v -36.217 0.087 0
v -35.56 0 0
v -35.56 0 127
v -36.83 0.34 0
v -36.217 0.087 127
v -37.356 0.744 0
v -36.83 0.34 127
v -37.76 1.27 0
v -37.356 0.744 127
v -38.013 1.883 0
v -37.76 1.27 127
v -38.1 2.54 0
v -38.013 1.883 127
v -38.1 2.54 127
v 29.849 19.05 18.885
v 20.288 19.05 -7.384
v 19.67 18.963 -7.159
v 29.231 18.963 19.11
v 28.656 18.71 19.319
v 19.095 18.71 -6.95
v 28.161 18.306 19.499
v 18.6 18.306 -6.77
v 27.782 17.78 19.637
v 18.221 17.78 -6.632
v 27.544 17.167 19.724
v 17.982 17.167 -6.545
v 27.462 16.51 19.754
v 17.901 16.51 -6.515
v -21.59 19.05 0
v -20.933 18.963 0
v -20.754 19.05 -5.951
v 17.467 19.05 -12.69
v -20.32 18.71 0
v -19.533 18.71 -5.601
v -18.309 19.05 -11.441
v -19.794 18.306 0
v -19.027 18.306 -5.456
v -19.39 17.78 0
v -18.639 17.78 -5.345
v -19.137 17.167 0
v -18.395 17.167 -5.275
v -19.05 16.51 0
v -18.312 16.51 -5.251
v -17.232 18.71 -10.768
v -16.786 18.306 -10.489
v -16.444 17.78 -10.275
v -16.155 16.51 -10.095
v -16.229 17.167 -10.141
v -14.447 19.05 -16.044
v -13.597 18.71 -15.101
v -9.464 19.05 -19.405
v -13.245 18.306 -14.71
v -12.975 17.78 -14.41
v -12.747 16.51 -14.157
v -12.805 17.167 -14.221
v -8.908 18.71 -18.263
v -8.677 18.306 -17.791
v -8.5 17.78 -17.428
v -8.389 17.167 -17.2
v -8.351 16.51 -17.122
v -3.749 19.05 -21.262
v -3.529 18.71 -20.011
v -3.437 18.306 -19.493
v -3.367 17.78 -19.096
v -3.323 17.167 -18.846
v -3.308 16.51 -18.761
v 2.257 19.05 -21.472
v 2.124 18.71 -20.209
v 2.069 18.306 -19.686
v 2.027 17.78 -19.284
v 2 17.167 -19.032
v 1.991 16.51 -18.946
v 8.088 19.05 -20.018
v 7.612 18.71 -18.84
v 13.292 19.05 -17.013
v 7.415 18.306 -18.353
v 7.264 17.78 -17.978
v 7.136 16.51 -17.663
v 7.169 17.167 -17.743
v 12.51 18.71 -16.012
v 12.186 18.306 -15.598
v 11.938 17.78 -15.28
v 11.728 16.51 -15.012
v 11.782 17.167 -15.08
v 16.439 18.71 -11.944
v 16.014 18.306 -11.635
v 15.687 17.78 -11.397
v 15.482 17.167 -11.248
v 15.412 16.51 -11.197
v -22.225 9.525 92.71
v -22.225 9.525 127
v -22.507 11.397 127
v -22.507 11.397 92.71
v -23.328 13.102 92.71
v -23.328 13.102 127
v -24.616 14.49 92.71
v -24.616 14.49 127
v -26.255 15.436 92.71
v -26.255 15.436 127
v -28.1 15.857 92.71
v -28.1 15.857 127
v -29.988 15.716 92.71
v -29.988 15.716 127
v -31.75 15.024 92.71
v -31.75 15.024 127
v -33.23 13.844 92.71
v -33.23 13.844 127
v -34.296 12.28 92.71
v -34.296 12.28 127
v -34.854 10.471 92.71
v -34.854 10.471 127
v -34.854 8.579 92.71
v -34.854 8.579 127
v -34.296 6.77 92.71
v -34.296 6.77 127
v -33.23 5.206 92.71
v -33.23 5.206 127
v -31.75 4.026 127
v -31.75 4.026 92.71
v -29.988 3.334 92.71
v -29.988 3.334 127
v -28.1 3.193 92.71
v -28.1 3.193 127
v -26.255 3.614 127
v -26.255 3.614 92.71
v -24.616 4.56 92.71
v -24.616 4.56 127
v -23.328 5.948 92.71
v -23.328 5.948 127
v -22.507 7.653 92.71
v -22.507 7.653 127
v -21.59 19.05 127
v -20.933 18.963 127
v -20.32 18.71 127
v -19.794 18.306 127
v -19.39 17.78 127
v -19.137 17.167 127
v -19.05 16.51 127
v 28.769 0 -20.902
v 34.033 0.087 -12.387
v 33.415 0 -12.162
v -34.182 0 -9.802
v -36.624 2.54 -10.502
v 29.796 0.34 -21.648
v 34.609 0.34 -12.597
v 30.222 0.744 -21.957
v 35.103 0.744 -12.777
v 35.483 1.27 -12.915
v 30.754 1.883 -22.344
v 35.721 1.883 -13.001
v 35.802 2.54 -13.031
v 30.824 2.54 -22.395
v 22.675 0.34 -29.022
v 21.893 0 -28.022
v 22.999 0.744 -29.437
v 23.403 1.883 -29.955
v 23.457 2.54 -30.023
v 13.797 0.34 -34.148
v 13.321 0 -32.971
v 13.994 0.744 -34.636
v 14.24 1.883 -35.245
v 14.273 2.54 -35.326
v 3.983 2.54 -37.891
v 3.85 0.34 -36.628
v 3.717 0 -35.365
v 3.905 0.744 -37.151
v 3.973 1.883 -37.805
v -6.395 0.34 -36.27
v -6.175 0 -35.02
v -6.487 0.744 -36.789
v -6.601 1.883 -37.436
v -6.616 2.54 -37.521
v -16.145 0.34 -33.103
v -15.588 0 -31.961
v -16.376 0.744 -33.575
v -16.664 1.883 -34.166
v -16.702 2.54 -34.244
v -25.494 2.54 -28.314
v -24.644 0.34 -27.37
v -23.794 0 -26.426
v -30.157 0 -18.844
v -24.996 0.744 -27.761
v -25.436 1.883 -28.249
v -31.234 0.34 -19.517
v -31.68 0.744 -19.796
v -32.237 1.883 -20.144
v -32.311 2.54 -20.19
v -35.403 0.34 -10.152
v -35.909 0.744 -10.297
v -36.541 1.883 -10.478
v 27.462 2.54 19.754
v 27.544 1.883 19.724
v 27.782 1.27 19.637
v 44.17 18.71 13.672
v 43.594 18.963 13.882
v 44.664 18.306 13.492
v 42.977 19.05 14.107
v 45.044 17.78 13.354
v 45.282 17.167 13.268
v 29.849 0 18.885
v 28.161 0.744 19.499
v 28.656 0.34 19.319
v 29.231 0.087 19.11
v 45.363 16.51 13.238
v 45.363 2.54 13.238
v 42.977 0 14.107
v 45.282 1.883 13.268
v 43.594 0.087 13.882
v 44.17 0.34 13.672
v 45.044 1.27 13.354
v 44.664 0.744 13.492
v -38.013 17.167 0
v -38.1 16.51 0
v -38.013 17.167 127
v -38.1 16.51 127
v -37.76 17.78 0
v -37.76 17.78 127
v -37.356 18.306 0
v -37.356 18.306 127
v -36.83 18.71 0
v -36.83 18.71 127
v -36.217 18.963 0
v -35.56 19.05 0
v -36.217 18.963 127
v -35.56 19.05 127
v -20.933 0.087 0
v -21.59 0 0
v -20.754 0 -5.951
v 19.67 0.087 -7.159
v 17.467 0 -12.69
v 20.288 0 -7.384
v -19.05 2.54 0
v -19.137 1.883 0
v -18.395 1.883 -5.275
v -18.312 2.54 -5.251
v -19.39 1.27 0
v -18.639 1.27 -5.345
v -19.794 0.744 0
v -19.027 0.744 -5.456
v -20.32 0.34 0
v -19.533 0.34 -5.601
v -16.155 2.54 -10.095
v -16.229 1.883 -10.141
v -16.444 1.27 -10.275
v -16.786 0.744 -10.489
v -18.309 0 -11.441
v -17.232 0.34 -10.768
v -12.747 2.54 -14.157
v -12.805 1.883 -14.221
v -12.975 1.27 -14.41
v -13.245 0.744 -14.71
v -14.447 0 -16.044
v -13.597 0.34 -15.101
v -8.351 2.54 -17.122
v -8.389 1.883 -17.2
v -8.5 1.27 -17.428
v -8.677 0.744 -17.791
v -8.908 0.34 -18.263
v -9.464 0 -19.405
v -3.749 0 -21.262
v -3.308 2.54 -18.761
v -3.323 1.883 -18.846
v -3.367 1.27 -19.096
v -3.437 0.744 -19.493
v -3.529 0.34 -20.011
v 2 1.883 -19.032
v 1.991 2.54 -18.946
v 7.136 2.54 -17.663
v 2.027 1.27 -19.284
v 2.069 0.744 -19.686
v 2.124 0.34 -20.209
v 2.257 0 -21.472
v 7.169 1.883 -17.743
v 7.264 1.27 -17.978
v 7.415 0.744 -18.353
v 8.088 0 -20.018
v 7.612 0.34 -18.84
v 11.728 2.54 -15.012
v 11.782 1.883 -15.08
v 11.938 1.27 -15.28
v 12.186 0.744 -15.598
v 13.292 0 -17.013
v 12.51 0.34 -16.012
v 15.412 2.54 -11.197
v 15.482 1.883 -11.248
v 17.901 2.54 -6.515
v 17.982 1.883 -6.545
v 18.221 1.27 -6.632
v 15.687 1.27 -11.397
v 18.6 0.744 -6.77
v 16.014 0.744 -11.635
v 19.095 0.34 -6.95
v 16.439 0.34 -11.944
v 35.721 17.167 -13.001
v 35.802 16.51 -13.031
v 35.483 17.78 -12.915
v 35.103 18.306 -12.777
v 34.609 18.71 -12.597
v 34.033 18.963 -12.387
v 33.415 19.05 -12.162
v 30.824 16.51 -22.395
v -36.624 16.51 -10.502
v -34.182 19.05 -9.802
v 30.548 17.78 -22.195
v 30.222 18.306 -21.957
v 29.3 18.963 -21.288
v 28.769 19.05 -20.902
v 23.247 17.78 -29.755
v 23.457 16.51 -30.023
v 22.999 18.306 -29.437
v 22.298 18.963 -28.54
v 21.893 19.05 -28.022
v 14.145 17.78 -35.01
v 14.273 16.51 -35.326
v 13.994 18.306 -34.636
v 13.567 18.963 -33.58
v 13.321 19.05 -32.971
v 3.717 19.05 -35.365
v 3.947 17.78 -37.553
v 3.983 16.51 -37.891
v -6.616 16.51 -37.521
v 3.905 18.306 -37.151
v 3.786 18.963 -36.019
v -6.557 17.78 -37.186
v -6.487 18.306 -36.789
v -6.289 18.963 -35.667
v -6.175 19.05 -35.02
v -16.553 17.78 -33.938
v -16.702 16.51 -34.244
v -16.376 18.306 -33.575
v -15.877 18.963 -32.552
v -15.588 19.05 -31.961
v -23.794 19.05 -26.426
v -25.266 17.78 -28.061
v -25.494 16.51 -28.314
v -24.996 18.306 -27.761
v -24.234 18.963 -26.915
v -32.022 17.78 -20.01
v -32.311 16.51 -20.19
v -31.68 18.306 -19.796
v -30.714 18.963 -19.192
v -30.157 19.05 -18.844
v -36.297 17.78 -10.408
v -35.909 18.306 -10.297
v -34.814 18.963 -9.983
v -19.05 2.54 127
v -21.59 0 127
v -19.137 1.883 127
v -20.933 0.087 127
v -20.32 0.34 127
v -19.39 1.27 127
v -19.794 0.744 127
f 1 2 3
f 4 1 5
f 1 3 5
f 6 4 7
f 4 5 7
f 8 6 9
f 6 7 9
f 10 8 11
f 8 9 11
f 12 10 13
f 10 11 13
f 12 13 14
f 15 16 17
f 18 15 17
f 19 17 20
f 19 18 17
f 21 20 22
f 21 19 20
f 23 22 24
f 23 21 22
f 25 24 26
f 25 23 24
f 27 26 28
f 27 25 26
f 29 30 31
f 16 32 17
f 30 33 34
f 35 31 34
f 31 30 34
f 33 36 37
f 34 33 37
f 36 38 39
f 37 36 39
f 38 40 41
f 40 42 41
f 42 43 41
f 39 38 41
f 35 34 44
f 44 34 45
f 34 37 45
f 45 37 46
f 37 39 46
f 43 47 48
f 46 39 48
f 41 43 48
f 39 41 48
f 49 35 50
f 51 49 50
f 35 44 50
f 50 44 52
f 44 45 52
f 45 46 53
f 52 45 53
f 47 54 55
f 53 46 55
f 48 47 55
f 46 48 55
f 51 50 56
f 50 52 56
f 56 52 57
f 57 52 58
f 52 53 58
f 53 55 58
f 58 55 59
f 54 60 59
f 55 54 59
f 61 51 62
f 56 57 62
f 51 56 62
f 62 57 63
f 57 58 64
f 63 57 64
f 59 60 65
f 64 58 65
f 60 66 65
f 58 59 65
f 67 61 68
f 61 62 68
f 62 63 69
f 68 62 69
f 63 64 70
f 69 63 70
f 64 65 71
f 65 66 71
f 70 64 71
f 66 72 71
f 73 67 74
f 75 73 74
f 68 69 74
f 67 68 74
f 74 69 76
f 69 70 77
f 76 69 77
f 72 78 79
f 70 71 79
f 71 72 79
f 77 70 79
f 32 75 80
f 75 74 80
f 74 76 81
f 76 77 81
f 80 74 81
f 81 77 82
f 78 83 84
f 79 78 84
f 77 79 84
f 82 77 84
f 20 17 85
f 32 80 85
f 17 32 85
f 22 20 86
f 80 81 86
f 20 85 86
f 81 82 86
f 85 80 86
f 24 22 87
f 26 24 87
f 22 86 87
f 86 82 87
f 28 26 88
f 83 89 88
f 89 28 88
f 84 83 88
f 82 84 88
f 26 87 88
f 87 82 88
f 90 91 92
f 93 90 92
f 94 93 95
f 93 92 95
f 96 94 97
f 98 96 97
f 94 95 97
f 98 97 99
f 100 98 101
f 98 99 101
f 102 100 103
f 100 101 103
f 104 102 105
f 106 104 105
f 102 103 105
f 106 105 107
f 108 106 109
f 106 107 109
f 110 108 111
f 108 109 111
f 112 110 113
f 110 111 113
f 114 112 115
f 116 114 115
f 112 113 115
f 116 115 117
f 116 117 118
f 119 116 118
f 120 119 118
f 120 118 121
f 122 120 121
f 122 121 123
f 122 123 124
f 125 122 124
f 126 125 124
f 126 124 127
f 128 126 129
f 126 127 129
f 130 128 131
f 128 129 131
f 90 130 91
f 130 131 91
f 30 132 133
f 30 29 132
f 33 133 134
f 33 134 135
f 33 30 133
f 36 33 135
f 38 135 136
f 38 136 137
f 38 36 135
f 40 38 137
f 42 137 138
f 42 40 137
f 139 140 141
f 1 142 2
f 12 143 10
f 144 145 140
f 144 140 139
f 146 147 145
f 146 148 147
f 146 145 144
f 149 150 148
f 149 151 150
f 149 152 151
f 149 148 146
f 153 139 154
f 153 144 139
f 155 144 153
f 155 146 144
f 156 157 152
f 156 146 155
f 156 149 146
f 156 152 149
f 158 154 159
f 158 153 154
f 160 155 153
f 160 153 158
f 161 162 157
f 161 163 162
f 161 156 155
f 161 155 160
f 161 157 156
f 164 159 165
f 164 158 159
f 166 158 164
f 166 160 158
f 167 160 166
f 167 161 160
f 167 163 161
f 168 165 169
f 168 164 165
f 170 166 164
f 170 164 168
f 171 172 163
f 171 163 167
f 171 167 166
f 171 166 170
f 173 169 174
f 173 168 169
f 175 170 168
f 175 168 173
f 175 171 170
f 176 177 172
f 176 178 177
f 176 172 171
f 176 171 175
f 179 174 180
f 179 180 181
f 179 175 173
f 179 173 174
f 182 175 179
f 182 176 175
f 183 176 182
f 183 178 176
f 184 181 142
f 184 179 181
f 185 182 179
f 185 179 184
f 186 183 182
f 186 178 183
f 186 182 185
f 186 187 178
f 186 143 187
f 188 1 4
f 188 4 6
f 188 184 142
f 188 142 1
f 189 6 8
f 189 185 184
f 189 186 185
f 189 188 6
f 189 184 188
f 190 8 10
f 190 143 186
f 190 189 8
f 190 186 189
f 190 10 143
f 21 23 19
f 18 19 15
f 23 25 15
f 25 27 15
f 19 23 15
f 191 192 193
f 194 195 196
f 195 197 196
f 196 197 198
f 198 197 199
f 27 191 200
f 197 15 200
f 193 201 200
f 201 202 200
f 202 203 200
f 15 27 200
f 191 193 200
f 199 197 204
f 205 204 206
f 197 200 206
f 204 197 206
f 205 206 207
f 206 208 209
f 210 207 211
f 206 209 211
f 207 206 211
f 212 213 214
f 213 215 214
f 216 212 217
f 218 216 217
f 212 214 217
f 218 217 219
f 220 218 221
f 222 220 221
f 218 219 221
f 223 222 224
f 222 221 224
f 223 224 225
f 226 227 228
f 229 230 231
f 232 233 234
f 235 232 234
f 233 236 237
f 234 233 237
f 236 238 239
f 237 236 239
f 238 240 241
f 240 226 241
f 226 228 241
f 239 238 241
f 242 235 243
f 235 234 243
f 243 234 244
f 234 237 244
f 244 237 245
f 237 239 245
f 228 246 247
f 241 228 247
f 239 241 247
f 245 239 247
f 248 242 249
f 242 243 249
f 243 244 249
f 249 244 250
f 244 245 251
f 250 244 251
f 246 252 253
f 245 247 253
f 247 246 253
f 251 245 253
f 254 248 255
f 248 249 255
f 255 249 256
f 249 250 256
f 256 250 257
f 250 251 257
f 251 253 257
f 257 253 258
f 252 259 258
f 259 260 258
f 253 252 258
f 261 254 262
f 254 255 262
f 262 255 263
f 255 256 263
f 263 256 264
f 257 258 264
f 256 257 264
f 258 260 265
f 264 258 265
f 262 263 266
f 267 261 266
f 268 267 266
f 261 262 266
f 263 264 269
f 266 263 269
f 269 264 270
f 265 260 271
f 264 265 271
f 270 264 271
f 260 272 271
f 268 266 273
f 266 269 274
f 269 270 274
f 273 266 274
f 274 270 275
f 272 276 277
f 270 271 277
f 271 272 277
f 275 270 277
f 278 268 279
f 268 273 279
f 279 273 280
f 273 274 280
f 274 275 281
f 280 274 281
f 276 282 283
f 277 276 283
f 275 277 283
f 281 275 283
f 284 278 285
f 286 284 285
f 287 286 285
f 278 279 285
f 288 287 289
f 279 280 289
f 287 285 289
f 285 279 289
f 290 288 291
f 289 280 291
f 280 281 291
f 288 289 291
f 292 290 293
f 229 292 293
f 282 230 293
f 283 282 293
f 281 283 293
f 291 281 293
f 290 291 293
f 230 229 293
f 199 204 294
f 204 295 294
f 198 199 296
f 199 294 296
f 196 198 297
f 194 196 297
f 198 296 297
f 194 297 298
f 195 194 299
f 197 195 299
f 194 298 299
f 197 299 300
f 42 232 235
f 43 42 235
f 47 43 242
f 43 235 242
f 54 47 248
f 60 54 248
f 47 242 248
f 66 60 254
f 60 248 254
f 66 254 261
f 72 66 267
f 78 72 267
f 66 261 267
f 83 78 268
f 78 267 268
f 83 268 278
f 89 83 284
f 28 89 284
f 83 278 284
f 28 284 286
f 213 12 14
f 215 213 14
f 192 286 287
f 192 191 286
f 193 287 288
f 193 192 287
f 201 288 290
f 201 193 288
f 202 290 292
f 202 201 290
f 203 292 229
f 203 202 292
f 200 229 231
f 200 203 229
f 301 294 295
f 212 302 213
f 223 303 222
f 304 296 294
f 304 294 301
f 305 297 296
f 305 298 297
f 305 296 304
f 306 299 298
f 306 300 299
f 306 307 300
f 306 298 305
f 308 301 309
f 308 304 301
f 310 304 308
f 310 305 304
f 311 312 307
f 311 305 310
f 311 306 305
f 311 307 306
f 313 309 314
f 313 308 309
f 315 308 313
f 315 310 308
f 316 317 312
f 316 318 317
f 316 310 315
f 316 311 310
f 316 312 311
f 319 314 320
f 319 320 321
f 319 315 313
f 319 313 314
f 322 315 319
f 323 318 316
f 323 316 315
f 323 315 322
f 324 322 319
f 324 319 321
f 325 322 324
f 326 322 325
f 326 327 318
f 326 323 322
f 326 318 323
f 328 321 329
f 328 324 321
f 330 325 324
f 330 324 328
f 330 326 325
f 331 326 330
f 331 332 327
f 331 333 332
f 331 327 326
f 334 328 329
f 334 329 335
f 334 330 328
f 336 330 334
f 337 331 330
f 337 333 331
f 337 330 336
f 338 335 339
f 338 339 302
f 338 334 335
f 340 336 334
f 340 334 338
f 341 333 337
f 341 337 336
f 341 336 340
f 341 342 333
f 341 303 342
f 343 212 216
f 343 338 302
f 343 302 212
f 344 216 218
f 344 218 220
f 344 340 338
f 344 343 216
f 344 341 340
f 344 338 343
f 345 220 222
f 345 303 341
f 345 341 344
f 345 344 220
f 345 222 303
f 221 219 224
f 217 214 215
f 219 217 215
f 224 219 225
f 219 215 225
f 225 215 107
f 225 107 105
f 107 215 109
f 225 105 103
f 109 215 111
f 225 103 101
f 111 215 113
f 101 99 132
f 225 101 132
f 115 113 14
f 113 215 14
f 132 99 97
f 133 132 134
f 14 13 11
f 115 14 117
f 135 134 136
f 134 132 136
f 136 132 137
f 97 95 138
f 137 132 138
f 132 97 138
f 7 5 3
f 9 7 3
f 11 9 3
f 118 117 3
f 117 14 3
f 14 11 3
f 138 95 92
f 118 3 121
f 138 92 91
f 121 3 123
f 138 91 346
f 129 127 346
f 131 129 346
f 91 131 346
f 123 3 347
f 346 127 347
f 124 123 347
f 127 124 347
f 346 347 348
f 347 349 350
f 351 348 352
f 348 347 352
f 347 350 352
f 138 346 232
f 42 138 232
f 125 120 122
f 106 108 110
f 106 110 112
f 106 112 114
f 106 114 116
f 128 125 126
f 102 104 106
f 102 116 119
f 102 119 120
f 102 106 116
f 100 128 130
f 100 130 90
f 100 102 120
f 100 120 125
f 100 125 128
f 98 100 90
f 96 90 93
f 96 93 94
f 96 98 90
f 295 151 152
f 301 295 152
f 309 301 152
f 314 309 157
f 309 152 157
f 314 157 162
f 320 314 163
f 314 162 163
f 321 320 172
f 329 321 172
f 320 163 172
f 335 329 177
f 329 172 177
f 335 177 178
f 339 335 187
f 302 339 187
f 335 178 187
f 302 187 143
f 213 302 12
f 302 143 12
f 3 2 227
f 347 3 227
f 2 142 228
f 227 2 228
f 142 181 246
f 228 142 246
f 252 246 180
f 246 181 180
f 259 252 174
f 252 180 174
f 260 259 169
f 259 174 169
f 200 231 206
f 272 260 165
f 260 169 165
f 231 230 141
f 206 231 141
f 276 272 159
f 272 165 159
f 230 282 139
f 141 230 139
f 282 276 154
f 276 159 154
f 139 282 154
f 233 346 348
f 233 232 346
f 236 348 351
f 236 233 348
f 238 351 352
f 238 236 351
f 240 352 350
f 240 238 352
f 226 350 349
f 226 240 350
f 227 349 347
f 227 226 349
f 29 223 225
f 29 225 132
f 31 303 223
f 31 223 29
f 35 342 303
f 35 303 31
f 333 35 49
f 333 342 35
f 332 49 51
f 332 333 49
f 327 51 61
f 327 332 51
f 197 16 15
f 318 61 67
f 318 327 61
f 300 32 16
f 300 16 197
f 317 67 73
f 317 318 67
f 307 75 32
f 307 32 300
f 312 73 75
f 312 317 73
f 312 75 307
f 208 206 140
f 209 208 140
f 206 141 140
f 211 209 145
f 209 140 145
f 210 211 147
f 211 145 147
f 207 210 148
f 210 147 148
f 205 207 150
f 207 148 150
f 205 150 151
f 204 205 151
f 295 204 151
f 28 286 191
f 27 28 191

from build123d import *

# Parameters (mm, degrees)
BOSS_EXTRUDE1_DEPTH = 19.05
SKETCH9_R           = 6.35
CUT_EXTRUDE2_DEPTH  = 34.29
FILLET1_R           = 2.54


with BuildPart() as part:
    # Sketch1 → Boss-Extrude1 (new body)
    with BuildSketch(Plane(origin=(0, 0, 0), x_dir=(1, 0, 0), z_dir=(0, 1, 0))):
        with BuildLine():
            Line((27.462285602, -19.753535756), (45.363430028, -13.238052025))
            Line((45.363430028, -13.238052025), (35.802288852, 13.030967461))
            ThreePointArc((35.802288852, 13.030967461), (-6.615995569, 37.52117539), (-38.1, 0))
            Line((-38.1, 0), (-38.1, -127))
            Line((-38.1, -127), (-19.05, -127))
            Line((-19.05, -127), (-19.05, 0))
            ThreePointArc((-19.05, 0), (-3.307997785, 18.760587695), (17.901144426, 6.51548373))
            Line((17.901144426, 6.51548373), (27.462285602, -19.753535756))
        make_face()
    extrude(amount=BOSS_EXTRUDE1_DEPTH)

    # Sketch9 → Cut-Extrude2 (cut)
    with BuildSketch(Plane.XY.offset(127)):
        with Locations((-28.575, 9.525)):
            Circle(SKETCH9_R)
    extrude(amount=-CUT_EXTRUDE2_DEPTH, mode=Mode.SUBTRACT)

    # Fillet1
    fillet1_edges = [part.edges().sort_by_distance(p)[0] for p in [
        (40.58285944, 19.05, 0.103542282),
        (22.681715014, 0, 6.619026013),
        (-6.615995569, 19.05, -37.52117539),
        (-38.1, 19.05, 63.5),
        (-19.05, 19.05, 63.5),
        (-3.307997785, 19.05, -18.760587695),
        (22.681715014, 19.05, 6.619026013),
        (-3.307997785, 0, -18.760587695),
        (-19.05, 0, 63.5),
        (-38.1, 0, 63.5),
        (-6.615995569, 0, -37.52117539),
        (40.58285944, 0, 0.103542282),
    ]]
    fillet(fillet1_edges, radius=FILLET1_R)


solid = part.part
